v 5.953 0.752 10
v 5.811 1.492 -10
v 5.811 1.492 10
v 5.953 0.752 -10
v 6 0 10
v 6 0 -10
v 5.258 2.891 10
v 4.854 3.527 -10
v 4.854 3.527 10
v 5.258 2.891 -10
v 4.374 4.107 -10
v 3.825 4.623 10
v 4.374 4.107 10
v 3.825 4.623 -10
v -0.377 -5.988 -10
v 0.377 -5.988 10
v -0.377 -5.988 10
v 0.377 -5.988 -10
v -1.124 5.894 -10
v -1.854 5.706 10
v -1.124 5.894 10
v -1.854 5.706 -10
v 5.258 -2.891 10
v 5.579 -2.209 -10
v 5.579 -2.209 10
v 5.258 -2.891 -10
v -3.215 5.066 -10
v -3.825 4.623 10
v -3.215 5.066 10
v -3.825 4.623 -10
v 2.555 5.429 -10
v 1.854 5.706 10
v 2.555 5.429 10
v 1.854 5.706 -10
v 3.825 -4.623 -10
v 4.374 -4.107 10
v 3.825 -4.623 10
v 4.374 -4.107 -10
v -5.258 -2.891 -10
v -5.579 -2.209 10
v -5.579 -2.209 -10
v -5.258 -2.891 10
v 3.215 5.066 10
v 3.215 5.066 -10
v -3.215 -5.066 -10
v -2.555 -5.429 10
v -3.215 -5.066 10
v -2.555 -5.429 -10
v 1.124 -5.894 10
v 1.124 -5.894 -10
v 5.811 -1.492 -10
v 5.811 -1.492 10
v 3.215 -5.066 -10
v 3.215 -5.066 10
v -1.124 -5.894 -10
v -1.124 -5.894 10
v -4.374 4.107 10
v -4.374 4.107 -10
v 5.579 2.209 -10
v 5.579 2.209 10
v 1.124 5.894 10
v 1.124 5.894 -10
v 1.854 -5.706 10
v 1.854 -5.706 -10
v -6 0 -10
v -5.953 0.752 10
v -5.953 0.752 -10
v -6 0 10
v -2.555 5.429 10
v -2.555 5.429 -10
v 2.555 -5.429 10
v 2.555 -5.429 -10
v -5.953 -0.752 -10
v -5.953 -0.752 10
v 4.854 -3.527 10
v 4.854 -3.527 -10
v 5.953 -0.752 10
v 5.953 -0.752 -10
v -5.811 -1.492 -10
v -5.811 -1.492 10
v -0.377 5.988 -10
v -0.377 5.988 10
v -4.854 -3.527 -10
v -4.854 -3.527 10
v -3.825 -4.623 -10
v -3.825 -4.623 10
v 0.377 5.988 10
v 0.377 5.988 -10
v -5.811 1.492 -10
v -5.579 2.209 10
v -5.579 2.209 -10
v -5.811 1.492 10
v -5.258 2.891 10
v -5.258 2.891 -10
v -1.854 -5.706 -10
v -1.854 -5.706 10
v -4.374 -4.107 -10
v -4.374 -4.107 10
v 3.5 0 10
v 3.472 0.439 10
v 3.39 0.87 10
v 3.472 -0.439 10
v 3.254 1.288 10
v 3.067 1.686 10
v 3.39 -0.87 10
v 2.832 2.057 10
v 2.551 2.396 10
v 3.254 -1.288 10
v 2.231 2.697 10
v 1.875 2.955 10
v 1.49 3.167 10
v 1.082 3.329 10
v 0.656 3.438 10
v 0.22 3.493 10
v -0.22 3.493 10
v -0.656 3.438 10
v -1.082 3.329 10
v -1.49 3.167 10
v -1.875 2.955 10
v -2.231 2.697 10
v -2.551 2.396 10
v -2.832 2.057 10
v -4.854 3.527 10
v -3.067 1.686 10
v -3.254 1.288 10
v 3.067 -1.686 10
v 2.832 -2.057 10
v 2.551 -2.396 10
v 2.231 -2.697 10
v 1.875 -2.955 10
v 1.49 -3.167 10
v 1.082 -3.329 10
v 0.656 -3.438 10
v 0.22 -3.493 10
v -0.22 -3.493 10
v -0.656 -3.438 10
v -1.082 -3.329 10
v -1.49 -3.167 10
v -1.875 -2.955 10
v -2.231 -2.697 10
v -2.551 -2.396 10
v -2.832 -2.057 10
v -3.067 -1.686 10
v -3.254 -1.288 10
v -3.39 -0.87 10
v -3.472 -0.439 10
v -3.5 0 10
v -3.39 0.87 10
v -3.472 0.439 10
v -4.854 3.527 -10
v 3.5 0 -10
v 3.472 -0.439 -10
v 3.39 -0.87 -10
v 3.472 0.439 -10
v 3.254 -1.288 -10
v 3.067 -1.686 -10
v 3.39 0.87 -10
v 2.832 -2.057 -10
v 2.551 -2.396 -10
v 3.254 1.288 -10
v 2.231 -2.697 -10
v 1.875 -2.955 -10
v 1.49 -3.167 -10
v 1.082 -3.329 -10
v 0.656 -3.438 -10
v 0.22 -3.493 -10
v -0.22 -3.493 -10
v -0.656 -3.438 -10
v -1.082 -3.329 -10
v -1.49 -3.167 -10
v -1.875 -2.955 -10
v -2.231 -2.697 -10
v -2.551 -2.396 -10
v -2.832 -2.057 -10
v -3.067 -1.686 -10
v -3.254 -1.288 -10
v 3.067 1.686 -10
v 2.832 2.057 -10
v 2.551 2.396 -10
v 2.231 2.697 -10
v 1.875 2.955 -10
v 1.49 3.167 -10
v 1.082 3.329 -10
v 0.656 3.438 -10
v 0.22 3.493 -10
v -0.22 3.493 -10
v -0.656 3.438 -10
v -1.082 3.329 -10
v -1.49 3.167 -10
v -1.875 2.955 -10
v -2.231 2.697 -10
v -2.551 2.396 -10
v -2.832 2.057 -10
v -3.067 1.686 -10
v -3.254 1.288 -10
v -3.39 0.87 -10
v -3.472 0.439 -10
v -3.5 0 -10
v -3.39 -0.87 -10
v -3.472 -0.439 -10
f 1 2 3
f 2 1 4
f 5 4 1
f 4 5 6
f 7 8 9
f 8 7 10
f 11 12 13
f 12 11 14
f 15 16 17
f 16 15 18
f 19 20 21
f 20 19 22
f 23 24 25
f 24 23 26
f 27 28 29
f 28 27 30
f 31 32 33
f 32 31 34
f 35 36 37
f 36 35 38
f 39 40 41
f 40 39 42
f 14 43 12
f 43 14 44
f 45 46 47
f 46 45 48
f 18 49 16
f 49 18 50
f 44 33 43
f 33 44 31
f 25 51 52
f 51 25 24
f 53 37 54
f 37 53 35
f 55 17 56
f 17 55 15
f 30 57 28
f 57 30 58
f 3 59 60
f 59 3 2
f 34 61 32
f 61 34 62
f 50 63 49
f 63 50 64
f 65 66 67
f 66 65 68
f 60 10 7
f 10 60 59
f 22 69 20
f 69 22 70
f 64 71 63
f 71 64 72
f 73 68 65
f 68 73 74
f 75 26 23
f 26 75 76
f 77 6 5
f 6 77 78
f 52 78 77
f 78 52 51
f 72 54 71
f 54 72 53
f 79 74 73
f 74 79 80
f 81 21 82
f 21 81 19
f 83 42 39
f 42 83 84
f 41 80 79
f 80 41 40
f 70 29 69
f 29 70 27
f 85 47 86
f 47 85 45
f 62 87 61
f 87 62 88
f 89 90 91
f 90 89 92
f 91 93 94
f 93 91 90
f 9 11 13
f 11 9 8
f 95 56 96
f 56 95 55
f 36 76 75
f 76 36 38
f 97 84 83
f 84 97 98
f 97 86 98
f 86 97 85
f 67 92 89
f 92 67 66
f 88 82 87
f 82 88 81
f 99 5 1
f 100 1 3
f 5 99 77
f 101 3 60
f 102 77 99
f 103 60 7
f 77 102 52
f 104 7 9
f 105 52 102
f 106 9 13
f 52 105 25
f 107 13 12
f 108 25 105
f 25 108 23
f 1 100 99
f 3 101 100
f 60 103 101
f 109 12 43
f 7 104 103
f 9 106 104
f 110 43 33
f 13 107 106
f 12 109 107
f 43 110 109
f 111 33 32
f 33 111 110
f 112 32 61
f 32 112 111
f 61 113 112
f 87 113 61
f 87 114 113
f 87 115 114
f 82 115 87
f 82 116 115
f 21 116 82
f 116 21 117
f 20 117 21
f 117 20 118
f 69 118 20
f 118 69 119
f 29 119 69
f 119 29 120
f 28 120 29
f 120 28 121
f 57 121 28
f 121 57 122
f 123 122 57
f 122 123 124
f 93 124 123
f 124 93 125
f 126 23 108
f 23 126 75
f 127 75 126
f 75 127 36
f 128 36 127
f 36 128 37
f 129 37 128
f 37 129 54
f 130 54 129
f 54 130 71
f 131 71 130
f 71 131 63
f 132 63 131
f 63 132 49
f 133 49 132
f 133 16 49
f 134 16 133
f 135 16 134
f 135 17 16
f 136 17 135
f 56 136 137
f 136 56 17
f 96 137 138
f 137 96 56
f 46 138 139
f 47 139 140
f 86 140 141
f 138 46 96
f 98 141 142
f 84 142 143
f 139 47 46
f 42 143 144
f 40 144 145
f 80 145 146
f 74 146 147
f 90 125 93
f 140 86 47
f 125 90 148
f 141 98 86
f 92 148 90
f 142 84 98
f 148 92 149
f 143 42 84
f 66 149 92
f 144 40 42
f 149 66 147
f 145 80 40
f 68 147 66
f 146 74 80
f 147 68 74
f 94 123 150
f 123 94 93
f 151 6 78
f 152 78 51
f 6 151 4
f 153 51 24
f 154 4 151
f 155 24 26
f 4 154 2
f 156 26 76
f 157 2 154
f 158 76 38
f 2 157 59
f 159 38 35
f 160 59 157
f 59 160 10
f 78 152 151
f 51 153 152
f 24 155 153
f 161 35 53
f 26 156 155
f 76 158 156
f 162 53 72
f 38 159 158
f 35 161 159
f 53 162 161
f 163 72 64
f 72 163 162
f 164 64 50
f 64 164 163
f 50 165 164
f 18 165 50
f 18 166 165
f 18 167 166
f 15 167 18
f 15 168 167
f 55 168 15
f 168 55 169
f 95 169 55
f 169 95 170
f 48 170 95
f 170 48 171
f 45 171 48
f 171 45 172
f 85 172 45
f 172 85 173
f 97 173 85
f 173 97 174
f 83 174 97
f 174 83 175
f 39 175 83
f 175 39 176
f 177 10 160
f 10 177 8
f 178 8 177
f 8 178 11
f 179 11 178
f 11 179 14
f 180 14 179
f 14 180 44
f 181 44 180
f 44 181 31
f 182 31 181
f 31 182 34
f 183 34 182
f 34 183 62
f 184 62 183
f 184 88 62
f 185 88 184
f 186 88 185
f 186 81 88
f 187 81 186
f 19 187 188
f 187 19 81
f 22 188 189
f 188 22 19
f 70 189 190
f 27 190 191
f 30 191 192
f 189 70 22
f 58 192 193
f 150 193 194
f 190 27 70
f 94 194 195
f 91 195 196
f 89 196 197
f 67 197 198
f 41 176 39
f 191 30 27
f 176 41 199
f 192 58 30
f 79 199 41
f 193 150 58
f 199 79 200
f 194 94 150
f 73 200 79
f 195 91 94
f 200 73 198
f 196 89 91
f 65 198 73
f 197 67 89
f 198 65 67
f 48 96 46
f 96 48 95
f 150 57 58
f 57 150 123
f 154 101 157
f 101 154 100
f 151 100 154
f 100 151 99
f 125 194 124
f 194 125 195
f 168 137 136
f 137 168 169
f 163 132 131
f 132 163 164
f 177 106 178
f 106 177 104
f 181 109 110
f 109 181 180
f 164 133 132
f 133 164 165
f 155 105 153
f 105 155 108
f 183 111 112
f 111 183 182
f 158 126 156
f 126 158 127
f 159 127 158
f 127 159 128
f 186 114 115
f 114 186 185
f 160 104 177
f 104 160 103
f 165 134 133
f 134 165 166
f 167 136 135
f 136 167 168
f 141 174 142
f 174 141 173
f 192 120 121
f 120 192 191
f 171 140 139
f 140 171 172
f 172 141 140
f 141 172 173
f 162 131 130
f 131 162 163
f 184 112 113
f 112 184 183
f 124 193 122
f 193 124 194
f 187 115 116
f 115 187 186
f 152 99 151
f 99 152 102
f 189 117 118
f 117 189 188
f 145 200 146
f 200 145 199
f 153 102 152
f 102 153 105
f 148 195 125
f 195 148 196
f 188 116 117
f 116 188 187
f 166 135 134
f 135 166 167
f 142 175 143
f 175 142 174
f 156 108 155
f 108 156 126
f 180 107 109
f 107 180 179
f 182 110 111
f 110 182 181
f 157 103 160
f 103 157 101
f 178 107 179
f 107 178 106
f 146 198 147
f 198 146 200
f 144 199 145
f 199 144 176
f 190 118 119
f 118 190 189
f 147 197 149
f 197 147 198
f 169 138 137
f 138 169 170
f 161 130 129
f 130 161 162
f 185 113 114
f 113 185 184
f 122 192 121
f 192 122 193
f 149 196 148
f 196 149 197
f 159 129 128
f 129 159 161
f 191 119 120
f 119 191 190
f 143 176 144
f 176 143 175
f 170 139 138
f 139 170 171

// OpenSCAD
$fn = 50;


difference() {
	union() {
		translate(v = [0, 0, -10.0000000000]) {
			cylinder(h = 20, r = 6.0000000000);
		}
	}
	union() {
		translate(v = [0, 0, -100.0000000000]) {
			cylinder(h = 200, r = 3.5000000000);
		}
	}
}
